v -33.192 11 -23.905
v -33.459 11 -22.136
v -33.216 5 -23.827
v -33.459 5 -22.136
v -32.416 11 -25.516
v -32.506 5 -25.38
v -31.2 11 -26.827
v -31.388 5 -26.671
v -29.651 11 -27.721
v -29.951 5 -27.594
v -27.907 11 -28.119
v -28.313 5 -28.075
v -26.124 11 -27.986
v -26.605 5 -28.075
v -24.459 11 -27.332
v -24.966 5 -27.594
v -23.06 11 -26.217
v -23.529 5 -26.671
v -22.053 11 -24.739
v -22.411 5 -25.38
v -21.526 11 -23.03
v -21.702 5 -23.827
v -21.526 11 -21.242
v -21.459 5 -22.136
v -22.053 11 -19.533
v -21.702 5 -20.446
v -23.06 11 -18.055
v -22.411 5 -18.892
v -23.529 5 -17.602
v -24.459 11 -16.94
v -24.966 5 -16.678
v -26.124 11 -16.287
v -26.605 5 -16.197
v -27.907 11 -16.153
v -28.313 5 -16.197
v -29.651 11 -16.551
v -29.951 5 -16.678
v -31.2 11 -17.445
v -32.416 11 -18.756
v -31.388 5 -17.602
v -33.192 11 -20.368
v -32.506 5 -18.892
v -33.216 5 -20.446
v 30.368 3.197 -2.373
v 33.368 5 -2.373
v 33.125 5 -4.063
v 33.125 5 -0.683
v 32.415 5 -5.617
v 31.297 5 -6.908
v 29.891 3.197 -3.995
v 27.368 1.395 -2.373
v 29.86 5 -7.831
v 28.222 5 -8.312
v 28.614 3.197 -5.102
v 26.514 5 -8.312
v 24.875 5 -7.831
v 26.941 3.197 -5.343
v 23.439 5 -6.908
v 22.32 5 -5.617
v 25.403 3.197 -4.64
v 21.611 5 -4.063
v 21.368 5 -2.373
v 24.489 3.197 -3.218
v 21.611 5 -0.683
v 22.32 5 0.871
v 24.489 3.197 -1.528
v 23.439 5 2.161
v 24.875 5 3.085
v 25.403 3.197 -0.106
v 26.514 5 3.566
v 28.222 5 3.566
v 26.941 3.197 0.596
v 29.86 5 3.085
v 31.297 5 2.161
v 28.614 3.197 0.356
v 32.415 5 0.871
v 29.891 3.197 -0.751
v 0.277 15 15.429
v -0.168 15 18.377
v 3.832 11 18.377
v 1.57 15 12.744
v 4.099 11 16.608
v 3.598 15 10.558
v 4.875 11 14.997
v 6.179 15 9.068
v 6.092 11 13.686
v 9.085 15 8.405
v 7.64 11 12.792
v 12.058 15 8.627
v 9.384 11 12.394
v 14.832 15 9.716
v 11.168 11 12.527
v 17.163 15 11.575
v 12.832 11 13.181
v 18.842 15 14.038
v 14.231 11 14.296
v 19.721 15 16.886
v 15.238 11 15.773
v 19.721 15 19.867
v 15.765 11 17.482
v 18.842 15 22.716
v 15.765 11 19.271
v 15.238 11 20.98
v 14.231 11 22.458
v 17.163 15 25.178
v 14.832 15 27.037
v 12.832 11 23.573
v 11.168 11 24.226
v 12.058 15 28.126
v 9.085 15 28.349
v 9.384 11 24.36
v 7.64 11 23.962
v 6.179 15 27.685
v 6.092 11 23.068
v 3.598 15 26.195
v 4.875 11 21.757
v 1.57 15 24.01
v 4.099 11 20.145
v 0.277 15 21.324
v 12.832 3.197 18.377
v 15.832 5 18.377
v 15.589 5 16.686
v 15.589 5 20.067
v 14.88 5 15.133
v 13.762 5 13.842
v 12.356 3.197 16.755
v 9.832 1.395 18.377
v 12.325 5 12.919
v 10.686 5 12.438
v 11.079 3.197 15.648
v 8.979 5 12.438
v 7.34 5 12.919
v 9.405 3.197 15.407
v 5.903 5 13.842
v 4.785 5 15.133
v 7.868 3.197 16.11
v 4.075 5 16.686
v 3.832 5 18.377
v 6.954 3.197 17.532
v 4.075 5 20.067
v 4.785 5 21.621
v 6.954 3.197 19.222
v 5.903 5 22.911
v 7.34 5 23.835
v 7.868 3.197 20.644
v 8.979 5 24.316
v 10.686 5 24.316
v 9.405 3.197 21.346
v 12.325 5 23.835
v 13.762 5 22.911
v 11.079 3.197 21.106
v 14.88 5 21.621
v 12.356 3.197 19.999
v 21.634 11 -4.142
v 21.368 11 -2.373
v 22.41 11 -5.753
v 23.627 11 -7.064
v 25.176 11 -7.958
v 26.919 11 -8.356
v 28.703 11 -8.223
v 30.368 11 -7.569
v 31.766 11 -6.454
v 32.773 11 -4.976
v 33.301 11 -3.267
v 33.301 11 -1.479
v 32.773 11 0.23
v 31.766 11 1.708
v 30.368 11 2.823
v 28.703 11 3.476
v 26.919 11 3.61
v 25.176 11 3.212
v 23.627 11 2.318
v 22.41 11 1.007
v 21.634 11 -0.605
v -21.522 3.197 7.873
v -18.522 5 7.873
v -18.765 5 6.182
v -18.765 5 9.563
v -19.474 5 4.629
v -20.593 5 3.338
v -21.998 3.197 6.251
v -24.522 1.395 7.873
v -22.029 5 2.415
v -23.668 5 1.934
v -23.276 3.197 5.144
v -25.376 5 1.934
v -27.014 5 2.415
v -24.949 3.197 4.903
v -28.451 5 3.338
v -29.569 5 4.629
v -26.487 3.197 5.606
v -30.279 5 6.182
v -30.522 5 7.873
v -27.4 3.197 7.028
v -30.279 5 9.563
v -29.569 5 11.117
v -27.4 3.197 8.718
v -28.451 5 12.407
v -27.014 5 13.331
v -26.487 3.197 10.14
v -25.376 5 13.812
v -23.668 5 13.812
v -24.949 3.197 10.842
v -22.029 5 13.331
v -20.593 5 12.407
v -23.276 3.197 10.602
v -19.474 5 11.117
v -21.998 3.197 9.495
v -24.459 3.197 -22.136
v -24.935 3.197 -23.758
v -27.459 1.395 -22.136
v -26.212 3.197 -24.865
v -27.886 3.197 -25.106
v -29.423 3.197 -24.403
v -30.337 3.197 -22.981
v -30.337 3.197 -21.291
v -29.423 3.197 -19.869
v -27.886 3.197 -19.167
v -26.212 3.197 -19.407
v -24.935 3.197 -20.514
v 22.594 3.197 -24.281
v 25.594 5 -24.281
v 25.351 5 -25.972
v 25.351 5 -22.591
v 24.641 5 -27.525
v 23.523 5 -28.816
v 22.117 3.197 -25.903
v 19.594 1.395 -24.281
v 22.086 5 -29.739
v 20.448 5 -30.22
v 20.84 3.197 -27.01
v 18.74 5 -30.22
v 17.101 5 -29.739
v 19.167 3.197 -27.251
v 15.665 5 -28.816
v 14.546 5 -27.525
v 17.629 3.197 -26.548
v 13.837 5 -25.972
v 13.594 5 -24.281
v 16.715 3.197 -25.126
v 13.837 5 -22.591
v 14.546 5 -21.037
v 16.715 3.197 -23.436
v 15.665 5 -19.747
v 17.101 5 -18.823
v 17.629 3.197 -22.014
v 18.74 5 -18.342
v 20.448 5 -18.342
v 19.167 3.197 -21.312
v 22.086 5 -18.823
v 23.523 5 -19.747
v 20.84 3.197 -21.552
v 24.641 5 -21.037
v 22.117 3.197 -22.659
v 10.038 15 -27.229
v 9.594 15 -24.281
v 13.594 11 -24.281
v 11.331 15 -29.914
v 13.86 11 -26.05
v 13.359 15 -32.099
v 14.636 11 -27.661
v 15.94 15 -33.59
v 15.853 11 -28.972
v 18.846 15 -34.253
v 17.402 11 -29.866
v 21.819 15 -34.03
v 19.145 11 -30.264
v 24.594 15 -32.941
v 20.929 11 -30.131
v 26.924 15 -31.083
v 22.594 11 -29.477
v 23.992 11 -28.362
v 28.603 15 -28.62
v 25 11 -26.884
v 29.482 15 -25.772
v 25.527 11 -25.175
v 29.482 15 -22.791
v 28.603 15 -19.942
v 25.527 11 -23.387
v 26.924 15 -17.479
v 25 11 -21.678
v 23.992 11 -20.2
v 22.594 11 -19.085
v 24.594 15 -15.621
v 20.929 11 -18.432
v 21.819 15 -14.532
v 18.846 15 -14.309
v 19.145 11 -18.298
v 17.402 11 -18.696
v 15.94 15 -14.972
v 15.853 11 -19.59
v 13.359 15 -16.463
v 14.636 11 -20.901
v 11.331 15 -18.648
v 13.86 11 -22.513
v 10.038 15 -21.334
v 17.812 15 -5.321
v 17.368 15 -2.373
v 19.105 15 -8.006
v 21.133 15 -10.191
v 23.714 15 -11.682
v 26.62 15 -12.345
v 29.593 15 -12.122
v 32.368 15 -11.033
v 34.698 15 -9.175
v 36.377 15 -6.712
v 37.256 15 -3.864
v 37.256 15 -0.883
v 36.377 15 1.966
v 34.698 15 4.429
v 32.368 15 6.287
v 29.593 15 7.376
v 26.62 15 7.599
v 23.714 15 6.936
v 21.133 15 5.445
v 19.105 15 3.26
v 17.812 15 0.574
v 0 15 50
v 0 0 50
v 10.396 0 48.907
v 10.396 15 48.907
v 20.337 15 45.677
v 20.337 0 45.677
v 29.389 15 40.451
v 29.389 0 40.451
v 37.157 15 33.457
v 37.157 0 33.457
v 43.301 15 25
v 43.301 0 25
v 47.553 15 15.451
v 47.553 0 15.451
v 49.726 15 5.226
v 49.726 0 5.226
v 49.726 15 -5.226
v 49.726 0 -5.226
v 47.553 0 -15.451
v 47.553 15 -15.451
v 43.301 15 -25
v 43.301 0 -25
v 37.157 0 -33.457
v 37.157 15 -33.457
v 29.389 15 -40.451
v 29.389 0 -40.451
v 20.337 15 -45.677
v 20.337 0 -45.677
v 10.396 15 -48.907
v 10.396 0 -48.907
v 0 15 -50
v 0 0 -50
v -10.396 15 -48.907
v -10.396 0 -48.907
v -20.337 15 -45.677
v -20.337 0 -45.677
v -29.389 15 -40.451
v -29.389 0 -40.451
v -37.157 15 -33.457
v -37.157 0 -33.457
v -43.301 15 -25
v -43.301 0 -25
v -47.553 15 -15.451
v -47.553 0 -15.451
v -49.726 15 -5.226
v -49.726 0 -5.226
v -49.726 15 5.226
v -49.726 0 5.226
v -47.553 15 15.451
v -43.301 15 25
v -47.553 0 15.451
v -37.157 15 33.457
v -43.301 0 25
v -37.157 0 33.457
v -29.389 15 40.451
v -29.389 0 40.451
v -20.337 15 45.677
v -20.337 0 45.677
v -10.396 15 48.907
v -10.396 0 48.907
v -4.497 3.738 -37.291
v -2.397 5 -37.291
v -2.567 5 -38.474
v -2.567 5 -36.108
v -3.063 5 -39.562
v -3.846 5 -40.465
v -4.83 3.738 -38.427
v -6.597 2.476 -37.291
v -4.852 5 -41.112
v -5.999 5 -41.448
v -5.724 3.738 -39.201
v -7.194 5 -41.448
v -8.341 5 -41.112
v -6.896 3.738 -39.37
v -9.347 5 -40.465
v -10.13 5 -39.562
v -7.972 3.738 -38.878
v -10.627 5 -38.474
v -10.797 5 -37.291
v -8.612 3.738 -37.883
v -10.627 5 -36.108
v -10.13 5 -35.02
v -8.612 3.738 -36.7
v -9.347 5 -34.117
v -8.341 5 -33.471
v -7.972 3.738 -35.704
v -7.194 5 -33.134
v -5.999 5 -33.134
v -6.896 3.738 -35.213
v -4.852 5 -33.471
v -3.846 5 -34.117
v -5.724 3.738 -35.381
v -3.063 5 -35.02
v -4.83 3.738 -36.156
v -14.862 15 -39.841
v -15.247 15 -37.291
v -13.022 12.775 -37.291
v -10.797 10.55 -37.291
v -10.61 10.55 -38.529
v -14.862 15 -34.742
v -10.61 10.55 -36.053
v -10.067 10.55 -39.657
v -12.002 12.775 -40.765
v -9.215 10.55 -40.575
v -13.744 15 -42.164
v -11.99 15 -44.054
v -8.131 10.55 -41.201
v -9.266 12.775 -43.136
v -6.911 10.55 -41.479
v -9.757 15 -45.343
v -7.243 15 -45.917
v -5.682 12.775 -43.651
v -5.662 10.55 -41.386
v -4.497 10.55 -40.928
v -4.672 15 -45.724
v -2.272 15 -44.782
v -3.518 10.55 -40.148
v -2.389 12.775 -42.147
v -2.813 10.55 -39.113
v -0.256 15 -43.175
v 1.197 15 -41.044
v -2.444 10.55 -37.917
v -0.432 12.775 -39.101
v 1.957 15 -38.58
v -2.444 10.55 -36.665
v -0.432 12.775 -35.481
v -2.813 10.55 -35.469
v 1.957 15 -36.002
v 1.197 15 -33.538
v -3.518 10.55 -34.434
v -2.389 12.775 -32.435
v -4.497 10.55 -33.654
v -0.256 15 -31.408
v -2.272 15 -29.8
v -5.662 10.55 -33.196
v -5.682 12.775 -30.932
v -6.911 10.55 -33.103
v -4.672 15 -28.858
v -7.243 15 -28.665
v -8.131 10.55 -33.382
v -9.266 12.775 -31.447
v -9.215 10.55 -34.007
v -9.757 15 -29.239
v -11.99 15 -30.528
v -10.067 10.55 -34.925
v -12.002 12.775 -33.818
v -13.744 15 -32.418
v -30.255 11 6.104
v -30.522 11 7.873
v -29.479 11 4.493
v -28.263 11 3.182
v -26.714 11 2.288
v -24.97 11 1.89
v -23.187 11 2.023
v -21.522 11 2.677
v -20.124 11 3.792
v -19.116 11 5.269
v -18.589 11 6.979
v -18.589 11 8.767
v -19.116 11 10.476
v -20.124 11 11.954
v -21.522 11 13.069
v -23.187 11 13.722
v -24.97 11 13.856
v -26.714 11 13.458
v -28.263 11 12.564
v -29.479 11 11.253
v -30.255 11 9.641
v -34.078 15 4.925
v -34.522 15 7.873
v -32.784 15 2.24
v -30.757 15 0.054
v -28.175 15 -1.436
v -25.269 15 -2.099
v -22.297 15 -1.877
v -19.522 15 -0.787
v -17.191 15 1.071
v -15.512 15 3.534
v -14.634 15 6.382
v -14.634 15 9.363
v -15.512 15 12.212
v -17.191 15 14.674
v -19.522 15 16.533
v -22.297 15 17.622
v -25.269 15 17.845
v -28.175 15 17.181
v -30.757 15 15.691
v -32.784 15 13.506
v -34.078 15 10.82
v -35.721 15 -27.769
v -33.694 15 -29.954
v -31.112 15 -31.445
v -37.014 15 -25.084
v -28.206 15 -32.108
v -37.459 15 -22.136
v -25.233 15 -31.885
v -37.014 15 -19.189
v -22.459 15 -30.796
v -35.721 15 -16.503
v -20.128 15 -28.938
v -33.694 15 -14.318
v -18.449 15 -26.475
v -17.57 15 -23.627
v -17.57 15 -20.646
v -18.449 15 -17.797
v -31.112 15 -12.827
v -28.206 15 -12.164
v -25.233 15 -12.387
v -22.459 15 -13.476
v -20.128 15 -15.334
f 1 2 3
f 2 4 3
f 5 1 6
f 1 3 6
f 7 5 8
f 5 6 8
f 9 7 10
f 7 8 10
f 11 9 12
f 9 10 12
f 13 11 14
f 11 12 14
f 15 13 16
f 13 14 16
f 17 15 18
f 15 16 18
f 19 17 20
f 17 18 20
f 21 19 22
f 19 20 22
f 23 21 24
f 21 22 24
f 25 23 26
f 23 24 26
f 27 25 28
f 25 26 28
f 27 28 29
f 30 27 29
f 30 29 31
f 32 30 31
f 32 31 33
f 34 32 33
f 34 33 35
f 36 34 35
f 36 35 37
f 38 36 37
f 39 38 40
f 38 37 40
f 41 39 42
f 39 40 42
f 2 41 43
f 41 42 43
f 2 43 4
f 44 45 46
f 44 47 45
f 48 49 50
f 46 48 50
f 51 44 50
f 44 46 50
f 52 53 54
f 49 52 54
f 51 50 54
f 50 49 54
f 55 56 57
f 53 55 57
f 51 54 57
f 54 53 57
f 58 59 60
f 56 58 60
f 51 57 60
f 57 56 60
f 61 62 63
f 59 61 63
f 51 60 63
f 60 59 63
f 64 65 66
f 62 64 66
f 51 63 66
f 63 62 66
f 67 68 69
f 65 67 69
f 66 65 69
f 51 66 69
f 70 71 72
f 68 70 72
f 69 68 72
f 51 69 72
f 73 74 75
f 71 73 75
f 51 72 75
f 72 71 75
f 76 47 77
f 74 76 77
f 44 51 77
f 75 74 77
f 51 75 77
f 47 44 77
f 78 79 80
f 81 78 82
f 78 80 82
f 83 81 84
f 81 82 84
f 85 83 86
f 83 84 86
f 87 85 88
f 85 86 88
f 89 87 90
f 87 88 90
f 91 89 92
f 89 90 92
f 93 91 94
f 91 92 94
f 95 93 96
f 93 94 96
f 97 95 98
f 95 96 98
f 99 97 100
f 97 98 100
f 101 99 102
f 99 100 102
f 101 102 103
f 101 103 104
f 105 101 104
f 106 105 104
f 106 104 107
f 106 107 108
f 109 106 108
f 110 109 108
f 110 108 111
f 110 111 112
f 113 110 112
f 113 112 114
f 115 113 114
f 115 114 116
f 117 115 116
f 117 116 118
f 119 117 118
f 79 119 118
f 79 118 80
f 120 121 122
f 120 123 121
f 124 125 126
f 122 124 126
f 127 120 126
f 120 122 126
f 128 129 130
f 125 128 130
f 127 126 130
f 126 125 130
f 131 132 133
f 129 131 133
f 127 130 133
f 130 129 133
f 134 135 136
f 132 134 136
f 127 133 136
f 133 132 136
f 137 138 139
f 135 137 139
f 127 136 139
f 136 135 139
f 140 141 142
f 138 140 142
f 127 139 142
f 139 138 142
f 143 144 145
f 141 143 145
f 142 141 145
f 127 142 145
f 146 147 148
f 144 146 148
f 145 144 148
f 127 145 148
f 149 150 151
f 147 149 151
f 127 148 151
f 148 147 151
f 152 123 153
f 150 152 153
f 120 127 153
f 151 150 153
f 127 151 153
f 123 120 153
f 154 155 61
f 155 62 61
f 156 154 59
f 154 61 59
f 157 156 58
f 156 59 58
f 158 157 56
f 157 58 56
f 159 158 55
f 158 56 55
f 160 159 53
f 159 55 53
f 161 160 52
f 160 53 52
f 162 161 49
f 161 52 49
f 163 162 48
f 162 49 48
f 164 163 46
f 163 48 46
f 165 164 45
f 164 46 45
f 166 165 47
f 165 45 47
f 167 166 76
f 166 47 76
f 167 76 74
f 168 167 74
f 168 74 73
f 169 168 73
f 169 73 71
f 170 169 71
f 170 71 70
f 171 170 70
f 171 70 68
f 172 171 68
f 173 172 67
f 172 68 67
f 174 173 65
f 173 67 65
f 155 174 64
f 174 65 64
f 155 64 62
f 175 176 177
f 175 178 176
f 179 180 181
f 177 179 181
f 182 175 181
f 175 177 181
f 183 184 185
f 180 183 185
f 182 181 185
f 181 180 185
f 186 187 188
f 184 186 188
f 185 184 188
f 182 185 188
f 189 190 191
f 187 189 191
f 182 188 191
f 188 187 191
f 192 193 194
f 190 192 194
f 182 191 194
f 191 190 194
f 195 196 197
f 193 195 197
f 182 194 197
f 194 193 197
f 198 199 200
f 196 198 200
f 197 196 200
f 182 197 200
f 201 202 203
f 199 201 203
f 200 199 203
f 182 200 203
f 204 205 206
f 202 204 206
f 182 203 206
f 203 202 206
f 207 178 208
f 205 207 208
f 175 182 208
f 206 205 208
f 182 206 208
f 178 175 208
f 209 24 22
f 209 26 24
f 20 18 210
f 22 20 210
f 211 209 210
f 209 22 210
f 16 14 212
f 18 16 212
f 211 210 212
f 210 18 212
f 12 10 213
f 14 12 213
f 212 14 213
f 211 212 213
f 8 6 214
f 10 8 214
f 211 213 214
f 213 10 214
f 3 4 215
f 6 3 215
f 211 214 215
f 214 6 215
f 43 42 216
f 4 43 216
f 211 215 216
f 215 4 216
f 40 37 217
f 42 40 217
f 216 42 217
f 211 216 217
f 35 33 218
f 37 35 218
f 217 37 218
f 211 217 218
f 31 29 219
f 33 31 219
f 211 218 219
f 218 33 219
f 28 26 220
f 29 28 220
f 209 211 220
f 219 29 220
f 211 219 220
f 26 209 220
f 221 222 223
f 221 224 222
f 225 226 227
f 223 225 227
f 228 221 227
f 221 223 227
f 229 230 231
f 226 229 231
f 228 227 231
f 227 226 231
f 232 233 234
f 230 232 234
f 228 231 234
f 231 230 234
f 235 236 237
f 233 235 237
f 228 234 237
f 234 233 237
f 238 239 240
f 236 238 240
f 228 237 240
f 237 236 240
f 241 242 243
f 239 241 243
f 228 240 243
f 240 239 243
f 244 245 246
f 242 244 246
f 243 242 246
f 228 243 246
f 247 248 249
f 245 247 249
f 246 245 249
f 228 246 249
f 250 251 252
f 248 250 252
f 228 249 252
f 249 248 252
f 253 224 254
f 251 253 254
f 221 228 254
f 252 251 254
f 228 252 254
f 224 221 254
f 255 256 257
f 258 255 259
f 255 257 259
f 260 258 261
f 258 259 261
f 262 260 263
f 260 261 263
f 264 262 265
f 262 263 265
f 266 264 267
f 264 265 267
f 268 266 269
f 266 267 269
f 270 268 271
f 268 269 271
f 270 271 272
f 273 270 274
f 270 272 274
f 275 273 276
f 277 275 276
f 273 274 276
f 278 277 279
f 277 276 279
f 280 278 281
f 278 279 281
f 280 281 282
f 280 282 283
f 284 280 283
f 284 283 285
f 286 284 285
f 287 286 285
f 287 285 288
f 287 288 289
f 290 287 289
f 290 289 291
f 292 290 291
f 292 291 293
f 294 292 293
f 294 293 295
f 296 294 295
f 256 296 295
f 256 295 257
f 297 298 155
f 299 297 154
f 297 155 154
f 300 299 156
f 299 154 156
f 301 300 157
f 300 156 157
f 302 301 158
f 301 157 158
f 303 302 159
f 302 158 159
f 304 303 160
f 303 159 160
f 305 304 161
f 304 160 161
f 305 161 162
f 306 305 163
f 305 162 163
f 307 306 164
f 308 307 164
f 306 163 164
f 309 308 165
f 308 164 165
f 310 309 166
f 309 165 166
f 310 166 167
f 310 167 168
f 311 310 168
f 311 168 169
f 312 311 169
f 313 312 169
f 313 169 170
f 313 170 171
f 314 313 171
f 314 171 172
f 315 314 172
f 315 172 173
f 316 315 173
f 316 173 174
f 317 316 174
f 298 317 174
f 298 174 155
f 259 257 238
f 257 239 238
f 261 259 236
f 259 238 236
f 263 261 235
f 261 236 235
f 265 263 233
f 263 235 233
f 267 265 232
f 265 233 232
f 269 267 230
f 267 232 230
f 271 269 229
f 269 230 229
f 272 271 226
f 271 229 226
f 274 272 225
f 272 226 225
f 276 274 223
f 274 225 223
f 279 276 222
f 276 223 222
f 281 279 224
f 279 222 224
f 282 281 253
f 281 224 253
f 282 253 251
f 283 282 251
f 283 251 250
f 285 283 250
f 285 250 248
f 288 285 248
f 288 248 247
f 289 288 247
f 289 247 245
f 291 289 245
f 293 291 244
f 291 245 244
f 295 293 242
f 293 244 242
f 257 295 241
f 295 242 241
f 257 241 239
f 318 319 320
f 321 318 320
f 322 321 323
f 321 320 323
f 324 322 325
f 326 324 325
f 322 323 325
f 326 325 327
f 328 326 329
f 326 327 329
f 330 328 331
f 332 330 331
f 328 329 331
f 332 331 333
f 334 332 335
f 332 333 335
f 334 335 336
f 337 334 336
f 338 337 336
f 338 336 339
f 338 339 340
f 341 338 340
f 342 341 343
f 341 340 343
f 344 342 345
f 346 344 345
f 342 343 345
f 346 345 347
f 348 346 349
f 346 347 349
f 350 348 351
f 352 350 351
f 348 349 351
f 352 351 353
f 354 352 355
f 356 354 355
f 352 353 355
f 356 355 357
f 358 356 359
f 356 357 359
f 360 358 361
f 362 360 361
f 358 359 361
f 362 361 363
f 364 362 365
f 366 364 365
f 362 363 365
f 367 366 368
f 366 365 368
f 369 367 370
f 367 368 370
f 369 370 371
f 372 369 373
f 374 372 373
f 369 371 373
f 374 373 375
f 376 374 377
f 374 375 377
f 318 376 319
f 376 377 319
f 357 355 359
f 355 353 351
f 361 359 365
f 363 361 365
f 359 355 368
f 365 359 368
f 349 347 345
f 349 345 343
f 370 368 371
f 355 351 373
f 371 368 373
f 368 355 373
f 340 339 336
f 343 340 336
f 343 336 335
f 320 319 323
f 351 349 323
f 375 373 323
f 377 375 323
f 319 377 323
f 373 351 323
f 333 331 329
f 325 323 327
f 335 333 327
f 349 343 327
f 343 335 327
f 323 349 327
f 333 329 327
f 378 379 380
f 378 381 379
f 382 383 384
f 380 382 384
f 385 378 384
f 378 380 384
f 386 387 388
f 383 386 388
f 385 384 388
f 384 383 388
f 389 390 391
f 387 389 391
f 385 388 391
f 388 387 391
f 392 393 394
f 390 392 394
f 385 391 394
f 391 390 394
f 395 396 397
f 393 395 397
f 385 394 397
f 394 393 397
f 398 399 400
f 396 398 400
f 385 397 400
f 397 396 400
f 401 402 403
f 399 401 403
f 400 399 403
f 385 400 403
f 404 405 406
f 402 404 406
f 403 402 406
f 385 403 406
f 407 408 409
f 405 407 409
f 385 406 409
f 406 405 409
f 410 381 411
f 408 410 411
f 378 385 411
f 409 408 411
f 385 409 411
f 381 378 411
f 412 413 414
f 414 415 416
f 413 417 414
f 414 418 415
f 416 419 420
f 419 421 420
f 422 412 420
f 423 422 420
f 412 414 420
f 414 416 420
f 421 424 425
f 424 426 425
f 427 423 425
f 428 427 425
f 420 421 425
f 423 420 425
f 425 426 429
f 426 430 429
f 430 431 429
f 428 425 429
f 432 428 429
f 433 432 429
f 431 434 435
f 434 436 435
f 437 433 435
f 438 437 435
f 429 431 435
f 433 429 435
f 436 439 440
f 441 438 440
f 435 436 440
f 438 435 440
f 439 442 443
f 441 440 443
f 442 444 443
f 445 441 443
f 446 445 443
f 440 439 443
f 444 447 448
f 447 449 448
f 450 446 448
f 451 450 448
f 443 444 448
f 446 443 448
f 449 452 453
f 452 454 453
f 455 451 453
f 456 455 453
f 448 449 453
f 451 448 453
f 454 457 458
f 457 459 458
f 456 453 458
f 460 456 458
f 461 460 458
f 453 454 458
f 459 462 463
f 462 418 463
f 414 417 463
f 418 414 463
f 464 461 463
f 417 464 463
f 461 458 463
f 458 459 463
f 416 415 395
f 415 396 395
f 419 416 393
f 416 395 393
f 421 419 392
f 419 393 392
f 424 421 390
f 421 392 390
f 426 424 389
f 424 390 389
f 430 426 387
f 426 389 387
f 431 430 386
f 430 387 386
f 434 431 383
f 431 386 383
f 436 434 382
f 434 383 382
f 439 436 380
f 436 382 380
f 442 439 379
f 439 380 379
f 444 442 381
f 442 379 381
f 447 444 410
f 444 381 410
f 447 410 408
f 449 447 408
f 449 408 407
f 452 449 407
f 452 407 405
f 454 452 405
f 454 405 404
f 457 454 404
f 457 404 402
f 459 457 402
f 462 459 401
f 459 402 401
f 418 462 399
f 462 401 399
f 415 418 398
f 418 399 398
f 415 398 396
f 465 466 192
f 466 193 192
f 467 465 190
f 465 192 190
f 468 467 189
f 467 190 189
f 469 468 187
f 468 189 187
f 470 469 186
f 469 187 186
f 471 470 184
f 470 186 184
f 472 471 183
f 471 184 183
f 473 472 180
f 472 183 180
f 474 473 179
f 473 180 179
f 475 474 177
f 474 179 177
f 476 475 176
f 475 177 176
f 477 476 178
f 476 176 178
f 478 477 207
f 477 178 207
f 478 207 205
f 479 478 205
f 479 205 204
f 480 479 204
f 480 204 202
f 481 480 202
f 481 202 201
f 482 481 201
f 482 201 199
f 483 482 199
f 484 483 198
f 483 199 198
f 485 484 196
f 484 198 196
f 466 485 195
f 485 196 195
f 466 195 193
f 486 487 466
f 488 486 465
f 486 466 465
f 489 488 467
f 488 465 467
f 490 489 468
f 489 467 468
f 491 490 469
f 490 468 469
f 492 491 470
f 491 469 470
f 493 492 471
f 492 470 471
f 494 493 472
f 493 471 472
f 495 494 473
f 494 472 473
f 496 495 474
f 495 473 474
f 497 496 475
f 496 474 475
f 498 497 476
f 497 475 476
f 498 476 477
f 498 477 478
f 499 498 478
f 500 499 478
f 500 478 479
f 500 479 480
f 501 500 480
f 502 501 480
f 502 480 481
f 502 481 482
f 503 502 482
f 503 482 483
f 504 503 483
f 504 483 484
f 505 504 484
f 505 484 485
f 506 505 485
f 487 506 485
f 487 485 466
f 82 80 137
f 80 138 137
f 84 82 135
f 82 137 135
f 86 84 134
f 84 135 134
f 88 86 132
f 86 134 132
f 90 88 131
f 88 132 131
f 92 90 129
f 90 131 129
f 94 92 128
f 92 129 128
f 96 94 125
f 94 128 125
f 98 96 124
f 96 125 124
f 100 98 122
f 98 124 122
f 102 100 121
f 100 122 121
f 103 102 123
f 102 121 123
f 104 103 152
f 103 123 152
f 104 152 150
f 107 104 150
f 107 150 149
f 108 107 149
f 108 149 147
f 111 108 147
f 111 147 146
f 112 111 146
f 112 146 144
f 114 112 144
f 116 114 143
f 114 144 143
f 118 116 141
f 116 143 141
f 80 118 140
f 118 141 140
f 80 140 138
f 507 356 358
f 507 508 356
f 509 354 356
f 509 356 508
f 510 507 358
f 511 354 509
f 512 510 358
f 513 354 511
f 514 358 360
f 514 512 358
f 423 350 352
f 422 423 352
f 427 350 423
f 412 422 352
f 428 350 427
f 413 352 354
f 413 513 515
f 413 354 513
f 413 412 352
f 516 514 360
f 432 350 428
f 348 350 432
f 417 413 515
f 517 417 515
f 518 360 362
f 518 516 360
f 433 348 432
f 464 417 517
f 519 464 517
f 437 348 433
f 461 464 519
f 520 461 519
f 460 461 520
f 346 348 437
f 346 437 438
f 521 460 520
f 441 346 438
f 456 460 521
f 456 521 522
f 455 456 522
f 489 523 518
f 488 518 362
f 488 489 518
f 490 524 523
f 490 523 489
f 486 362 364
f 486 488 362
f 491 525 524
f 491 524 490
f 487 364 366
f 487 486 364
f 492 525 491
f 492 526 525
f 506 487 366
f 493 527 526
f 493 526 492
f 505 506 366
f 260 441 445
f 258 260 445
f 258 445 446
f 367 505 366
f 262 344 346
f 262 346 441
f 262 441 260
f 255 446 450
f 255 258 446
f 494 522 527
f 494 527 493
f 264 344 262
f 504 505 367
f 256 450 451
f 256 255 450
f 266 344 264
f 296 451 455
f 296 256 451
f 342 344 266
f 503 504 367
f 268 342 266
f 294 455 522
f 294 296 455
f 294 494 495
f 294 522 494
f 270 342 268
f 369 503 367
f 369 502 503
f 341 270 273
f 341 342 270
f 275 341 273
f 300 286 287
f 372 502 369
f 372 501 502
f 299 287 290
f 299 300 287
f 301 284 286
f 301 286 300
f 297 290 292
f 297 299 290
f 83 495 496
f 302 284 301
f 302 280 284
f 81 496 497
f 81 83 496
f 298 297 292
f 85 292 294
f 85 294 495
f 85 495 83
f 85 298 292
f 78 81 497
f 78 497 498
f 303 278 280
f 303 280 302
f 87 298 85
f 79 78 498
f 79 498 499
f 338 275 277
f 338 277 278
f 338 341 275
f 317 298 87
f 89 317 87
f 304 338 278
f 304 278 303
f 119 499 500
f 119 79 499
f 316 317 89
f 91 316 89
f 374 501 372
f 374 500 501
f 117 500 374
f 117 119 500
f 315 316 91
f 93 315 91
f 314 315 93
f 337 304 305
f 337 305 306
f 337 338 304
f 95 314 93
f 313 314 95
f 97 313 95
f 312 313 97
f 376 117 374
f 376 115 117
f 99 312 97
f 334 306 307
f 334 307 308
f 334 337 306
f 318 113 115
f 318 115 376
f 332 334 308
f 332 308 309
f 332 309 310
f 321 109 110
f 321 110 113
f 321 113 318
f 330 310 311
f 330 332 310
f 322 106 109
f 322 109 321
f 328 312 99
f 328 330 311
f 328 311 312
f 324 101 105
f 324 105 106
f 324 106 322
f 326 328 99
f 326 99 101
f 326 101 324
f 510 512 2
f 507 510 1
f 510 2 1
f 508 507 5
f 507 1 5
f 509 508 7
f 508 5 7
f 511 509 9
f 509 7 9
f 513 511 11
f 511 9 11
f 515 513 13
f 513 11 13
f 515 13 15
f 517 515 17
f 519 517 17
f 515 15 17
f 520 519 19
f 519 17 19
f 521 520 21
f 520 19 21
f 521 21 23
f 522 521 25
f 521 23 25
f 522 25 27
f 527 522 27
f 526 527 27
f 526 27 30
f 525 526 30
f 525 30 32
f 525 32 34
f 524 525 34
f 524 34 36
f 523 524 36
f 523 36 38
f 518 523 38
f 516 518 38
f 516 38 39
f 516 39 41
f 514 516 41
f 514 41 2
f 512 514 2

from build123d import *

# Parameters (mm, degrees)
SKETCH1_R                                            = 50
BOSS_EXTRUDE1_DEPTH                                  = 15
CSK_FOR_M10_COUNTERSUNK_FLAT_HEAD_SCREW2_D           = 12
CSK_FOR_M10_COUNTERSUNK_FLAT_HEAD_SCREW2_DEPTH       = 10
CSK_FOR_M10_COUNTERSUNK_FLAT_HEAD_SCREW2_CSINK_D     = 20
CSK_FOR_M10_COUNTERSUNK_FLAT_HEAD_SCREW2_CSINK_ANGLE = 90
CSK_FOR_M10_COUNTERSUNK_FLAT_HEAD_SCREW2_TIP         = 3.605163714
CSK_FOR_M8_COUNTERSUNK_FLAT_HEAD_SCREW1_D            = 8.4
CSK_FOR_M8_COUNTERSUNK_FLAT_HEAD_SCREW1_DEPTH        = 10
CSK_FOR_M8_COUNTERSUNK_FLAT_HEAD_SCREW1_CSINK_D      = 17.3
CSK_FOR_M8_COUNTERSUNK_FLAT_HEAD_SCREW1_CSINK_ANGLE  = 90
CSK_FOR_M8_COUNTERSUNK_FLAT_HEAD_SCREW1_TIP          = 2.5236146


with BuildPart() as part:
    # Sketch1 → Boss-Extrude1 (new body)
    with BuildSketch(Plane(origin=(0, 0, 0), x_dir=(1, 0, 0), z_dir=(0, 1, 0))):
        with Locations(Location((0, 0, 0), (0, 0, 270))):
            Circle(SKETCH1_R)
    extrude(amount=BOSS_EXTRUDE1_DEPTH)

    # CSK for M10 Countersunk Flat Head Screw2
    with Locations(Plane(origin=(0, 15, 0), x_dir=(1, 0, 0), z_dir=(0, 1, 0))):
        with Locations((-27.458630514, 22.136146371), (19.59369175, 24.281141581), (-24.521924649, -7.872760418), (9.832439438, -18.376753366), (27.367685205, 2.373094983)):
            CounterSinkHole(CSK_FOR_M10_COUNTERSUNK_FLAT_HEAD_SCREW2_D / 2, CSK_FOR_M10_COUNTERSUNK_FLAT_HEAD_SCREW2_CSINK_D / 2, depth=CSK_FOR_M10_COUNTERSUNK_FLAT_HEAD_SCREW2_DEPTH, counter_sink_angle=CSK_FOR_M10_COUNTERSUNK_FLAT_HEAD_SCREW2_CSINK_ANGLE)
            with Locations((0, 0, -(CSK_FOR_M10_COUNTERSUNK_FLAT_HEAD_SCREW2_DEPTH + CSK_FOR_M10_COUNTERSUNK_FLAT_HEAD_SCREW2_TIP / 2))):  # 118° drill point
                Cone(0, CSK_FOR_M10_COUNTERSUNK_FLAT_HEAD_SCREW2_D / 2, CSK_FOR_M10_COUNTERSUNK_FLAT_HEAD_SCREW2_TIP, mode=Mode.SUBTRACT)

    # CSK for M8 Countersunk Flat Head Screw1
    with Locations(Plane(origin=(0, 15, 0), x_dir=(1, 0, 0), z_dir=(0, 1, 0))):
        with Locations((-6.596639158, 37.29118486)):
            CounterSinkHole(CSK_FOR_M8_COUNTERSUNK_FLAT_HEAD_SCREW1_D / 2, CSK_FOR_M8_COUNTERSUNK_FLAT_HEAD_SCREW1_CSINK_D / 2, depth=CSK_FOR_M8_COUNTERSUNK_FLAT_HEAD_SCREW1_DEPTH, counter_sink_angle=CSK_FOR_M8_COUNTERSUNK_FLAT_HEAD_SCREW1_CSINK_ANGLE)
            with Locations((0, 0, -(CSK_FOR_M8_COUNTERSUNK_FLAT_HEAD_SCREW1_DEPTH + CSK_FOR_M8_COUNTERSUNK_FLAT_HEAD_SCREW1_TIP / 2))):  # 118° drill point
                Cone(0, CSK_FOR_M8_COUNTERSUNK_FLAT_HEAD_SCREW1_D / 2, CSK_FOR_M8_COUNTERSUNK_FLAT_HEAD_SCREW1_TIP, mode=Mode.SUBTRACT)


solid = part.part
